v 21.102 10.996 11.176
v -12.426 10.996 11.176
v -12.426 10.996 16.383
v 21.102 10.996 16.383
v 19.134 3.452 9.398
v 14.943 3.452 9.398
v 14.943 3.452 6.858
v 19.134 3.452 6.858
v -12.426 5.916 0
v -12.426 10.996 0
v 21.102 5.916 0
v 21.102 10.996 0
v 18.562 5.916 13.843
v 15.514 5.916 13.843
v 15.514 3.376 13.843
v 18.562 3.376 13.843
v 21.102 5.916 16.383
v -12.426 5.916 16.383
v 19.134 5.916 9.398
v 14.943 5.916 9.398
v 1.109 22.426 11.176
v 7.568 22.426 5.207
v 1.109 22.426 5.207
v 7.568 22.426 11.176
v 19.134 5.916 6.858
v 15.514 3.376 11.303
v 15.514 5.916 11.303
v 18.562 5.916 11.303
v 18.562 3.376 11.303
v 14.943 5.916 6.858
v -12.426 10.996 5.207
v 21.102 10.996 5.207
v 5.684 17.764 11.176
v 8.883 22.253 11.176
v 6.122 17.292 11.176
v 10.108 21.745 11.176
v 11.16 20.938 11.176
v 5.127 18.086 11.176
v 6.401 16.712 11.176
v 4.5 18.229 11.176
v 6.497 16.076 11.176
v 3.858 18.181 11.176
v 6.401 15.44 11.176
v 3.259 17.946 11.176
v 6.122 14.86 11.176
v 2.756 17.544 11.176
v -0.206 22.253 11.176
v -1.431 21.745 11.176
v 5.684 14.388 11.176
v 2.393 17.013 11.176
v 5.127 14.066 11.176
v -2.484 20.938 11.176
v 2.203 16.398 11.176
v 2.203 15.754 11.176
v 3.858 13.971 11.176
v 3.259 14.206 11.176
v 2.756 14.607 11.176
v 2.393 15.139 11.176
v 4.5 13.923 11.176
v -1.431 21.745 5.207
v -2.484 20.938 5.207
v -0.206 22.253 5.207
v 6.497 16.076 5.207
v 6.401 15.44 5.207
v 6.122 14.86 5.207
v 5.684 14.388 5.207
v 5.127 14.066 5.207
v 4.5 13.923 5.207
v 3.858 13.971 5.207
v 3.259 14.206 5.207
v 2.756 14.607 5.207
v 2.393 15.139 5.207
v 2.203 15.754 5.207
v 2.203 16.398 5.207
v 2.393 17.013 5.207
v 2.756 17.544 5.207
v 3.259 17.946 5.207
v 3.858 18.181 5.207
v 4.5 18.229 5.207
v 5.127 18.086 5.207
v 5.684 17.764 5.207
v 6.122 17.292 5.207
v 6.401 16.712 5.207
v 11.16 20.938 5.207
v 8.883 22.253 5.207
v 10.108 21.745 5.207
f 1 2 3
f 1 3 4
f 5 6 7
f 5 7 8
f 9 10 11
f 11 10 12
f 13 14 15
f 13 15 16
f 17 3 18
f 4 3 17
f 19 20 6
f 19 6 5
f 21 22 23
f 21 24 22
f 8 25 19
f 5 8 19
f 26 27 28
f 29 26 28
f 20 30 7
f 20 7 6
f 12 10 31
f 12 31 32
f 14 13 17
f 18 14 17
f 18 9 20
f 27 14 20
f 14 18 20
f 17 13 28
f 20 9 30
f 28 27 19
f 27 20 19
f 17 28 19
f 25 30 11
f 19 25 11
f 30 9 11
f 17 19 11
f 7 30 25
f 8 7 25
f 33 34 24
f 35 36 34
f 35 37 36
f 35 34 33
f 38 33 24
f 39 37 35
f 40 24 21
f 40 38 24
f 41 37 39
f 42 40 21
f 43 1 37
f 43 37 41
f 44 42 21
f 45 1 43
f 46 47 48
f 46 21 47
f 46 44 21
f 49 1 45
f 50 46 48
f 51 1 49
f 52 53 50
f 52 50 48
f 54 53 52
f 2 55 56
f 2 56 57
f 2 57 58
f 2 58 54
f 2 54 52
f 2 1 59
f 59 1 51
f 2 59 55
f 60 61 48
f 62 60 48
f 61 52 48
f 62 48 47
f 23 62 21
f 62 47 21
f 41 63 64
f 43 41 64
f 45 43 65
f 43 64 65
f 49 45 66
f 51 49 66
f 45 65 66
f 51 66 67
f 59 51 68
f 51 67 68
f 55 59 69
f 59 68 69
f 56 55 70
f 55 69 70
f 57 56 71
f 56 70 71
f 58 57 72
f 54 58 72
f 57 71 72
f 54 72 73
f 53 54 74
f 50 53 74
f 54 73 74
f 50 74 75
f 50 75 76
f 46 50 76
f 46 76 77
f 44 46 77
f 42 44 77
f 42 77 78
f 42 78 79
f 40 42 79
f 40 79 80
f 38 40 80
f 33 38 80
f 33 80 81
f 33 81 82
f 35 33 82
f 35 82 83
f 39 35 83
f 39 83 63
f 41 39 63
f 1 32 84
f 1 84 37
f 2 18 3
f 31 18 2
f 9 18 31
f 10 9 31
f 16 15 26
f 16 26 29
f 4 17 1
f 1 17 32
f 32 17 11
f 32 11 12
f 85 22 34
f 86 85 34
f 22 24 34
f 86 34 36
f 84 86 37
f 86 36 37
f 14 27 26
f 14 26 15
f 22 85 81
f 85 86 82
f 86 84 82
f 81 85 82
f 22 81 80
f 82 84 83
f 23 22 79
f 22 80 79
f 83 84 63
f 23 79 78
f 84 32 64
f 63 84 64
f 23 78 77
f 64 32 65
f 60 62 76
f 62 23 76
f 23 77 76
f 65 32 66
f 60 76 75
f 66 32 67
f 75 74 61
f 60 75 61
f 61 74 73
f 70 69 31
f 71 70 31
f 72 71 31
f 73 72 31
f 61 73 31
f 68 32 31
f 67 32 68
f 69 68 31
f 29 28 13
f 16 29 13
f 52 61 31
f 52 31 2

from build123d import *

# Parameters (mm, degrees)
F0_W      = 33.528
F0_H      = 5.08
F1_DEPTH  = 16.383
F2_W      = 33.528
F2_H      = 5.969
F3_DEPTH  = 11.43
F4_SIZE   = 11.43
F5_R      = 2.159
F6_DEPTH  = 25.4
F7_W      = 3.048
F7_H      = 2.54
F8_DEPTH  = 2.54
F9_W      = 4.191
F9_H      = 2.54
F10_DEPTH = 2.4638
F11_R     = 5.08


with BuildPart() as f1:
    # F0 (on Top) → F1 (new body)
    with BuildSketch(Plane.XY):
        with Locations((4.3383603916, 8.4559087365)):
            Rectangle(F0_W, F0_H)
    extrude(amount=F1_DEPTH)

    # F2 (on face) → F3 (join)
    with BuildSketch(Plane(origin=(0, 10.9959087365, 0), x_dir=(-1, 0, 0), z_dir=(0, 1, 0))):
        with Locations((-4.3383603916, 8.1915)):
            Rectangle(F2_W, F2_H)
    extrude(amount=F3_DEPTH)

    # F4
    f4_edges = [f1.edges().sort_by_distance(p)[0] for p in [
        (-12.42564, 22.425909, 8.1915),
        (21.10236, 22.425909, 8.1915),
    ]]
    chamfer(f4_edges, length=F4_SIZE)

    # F5 (on face) → F6 (cut)
    with BuildSketch(Plane(origin=(0, 0, 5.207), x_dir=(1, 0, 0), z_dir=(0, 0, -1))):
        with Locations((4.3383603916, -16.0759087365)):
            Circle(F5_R)
    extrude(amount=-F6_DEPTH, mode=Mode.SUBTRACT)

    # F7 (on face) → F8 (join)
    with BuildSketch(Plane.XZ.offset(-5.9159087365)):
        with Locations((17.0383603916, 12.573)):
            Rectangle(F7_W, F7_H)
    extrude(amount=F8_DEPTH)

    # F9 (on face) → F10 (join)
    with BuildSketch(Plane.XZ.offset(-5.9159087365)):
        with Locations((17.0383603916, 8.128)):
            Rectangle(F9_W, F9_H)
    extrude(amount=F10_DEPTH)

    # F11
    f11_edges = [f1.edges().sort_by_distance(p)[0] for p in [
        (-0.99564, 22.425909, 8.1915),
        (9.67236, 22.425909, 8.1915),
    ]]
    fillet(f11_edges, radius=F11_R)


solid = f1.part
